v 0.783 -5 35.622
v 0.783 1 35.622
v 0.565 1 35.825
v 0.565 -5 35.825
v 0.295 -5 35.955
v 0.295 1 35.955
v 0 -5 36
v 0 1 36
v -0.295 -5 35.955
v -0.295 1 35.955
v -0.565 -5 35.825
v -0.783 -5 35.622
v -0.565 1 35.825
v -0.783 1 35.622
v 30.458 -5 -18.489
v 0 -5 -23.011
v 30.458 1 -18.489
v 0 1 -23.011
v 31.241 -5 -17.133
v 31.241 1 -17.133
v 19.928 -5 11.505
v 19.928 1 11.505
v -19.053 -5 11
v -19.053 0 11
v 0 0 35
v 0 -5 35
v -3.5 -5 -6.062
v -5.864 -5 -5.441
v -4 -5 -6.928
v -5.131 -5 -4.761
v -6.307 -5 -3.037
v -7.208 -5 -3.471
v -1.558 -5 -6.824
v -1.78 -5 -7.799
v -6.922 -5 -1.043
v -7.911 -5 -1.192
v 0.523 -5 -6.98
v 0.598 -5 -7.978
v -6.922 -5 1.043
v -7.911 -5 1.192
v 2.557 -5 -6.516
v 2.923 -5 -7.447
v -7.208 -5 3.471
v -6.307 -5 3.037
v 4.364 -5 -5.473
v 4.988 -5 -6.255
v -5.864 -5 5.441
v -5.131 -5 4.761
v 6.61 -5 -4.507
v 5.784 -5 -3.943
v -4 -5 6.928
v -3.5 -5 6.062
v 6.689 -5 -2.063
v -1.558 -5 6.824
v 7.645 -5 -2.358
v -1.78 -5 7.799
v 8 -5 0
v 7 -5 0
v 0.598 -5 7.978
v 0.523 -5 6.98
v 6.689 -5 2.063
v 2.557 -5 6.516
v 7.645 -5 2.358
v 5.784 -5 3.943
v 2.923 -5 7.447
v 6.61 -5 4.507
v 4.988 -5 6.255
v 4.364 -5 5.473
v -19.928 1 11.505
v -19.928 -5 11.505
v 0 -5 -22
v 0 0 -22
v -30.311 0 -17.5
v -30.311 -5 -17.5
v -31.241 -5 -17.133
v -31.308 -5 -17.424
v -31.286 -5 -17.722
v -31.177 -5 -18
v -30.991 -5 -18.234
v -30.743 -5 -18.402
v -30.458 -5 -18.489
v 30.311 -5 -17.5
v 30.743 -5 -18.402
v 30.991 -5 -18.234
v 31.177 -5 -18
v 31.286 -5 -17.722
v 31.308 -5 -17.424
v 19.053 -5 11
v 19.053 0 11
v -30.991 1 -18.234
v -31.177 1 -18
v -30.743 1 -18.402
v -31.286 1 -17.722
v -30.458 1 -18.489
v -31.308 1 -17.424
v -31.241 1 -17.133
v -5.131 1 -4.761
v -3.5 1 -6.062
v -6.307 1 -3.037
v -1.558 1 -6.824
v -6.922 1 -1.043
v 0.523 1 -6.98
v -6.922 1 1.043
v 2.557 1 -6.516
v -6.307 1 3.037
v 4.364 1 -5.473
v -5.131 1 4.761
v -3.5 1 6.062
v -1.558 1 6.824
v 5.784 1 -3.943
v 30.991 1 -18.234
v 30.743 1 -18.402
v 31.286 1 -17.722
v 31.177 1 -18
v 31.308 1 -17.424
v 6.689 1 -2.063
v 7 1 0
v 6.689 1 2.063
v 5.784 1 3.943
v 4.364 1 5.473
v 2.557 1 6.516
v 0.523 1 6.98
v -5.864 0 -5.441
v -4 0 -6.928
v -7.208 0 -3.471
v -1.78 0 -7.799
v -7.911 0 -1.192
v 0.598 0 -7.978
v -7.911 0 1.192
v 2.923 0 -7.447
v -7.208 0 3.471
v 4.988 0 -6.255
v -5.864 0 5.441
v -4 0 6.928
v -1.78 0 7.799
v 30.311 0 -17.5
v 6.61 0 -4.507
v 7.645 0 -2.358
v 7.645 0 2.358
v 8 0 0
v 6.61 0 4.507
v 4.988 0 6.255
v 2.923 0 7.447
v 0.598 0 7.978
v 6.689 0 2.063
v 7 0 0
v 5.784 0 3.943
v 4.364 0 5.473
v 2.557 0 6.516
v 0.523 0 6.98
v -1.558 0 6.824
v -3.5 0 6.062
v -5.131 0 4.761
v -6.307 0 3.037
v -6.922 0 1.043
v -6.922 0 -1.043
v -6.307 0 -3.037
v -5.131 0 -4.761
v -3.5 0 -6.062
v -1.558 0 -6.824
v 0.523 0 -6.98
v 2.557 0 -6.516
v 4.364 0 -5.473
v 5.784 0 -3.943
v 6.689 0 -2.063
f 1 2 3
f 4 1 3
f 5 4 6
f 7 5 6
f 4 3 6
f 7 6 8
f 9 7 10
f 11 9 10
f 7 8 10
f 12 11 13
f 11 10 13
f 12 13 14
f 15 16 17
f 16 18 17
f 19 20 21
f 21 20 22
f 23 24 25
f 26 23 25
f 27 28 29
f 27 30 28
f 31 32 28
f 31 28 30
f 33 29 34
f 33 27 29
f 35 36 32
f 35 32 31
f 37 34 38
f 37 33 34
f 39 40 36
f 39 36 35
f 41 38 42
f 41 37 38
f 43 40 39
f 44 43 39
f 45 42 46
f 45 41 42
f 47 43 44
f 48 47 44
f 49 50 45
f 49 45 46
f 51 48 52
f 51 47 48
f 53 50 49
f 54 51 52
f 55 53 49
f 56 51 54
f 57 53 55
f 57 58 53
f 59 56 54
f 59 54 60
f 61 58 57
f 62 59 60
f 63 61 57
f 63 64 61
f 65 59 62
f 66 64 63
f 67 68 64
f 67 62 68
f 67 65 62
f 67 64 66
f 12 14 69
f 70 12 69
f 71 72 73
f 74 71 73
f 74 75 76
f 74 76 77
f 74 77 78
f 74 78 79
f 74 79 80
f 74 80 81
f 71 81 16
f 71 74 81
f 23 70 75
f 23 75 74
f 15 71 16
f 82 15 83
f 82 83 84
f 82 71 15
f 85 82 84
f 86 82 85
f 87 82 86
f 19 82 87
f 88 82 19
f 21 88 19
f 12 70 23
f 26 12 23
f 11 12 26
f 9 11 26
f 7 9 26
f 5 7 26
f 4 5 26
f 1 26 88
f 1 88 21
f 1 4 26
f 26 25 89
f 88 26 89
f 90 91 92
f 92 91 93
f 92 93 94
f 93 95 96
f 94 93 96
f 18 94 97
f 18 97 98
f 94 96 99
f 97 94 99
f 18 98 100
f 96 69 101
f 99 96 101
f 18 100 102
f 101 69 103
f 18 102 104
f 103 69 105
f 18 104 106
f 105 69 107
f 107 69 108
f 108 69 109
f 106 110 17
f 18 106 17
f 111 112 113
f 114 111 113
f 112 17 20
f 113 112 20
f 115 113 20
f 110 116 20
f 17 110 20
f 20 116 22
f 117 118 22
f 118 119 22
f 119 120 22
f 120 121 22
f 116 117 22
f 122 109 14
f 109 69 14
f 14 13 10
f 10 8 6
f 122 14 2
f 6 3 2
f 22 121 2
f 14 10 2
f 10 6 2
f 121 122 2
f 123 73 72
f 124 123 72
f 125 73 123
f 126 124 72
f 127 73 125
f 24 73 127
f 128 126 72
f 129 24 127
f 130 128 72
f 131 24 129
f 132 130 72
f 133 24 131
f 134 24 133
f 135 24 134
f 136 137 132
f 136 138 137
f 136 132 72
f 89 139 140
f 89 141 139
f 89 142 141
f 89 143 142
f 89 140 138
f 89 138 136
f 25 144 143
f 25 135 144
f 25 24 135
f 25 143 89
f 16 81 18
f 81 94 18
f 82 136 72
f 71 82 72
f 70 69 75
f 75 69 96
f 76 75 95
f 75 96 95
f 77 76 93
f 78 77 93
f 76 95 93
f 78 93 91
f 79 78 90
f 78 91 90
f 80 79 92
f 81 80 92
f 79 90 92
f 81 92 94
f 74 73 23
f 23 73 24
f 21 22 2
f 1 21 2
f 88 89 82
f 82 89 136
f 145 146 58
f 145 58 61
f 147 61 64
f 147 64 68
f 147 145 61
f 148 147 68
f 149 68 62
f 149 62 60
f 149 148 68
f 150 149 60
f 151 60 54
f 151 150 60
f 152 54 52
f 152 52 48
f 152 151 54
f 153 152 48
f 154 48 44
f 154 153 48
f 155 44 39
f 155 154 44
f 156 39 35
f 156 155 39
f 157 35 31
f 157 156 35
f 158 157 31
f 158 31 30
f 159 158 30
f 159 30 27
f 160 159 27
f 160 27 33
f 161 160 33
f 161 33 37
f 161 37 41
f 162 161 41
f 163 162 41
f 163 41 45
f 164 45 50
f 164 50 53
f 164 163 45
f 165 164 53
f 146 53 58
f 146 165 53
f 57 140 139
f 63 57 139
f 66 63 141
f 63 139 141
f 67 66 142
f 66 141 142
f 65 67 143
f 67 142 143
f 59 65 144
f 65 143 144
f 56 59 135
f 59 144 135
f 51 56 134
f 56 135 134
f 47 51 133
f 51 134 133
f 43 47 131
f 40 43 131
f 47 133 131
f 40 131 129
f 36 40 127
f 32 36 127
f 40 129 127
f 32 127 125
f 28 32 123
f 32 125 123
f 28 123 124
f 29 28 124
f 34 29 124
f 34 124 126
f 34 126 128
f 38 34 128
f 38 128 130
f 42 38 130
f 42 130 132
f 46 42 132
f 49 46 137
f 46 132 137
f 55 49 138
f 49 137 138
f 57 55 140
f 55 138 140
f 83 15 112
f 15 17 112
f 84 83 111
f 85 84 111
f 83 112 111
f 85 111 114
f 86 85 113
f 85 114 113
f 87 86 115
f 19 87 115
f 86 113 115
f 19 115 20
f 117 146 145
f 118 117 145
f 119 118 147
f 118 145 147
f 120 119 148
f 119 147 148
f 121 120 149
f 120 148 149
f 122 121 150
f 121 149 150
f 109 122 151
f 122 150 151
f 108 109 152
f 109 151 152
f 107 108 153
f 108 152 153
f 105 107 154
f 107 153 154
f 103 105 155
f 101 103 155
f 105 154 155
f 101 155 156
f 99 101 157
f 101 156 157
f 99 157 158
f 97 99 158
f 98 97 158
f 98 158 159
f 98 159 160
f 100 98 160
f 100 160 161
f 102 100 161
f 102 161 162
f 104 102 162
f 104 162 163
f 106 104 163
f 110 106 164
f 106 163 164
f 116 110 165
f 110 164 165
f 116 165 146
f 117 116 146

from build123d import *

# Parameters (mm, degrees)
F0_R     = 8
F0_R_2   = 7
F1_DEPTH = 1
F2_DEPTH = 5


with BuildPart() as f1:
    # F0 (on Front) → F1 (new body)
    with BuildSketch(Plane.XZ):
        with BuildLine():
            Line((-19.928076, 11.50548), (-31.240951, -17.132598))
            ThreePointArc((-31.240951, -17.132598), (-31.176915, -18), (-30.457741, -18.489158))
            Line((-30.457741, -18.489158), (0, -23.01096))
            Line((0, -23.01096), (30.457741, -18.489158))
            ThreePointArc((30.457741, -18.489158), (31.176915, -18), (31.240951, -17.132598))
            Line((31.240951, -17.132598), (19.928076, 11.50548))
            Line((19.928076, 11.50548), (0.78321, 35.621757))
            ThreePointArc((0.78321, 35.621757), (0, 36), (-0.78321, 35.621757))
            Line((-0.78321, 35.621757), (-19.928076, 11.50548))
        make_face()
        Polygon((0, -22), (-30.310889, -17.5), (-19.052559, 11), (0, 35), (19.052559, 11), (30.310889, -17.5), align=None, mode=Mode.SUBTRACT)
        Polygon((-19.052559, 11), (-30.310889, -17.5), (0, -22), (30.310889, -17.5), (19.052559, 11), (0, 35), align=None)
        Circle(F0_R, mode=Mode.SUBTRACT)
        Circle(F0_R)
        Circle(F0_R_2, mode=Mode.SUBTRACT)
    extrude(amount=-F1_DEPTH)

    # F0 (on Front) → F2 (join)
    with BuildSketch(Plane.XZ):
        with BuildLine():
            Line((-19.928076, 11.50548), (-31.240951, -17.132598))
            ThreePointArc((-31.240951, -17.132598), (-31.176915, -18), (-30.457741, -18.489158))
            Line((-30.457741, -18.489158), (0, -23.01096))
            Line((0, -23.01096), (30.457741, -18.489158))
            ThreePointArc((30.457741, -18.489158), (31.176915, -18), (31.240951, -17.132598))
            Line((31.240951, -17.132598), (19.928076, 11.50548))
            Line((19.928076, 11.50548), (0.78321, 35.621757))
            ThreePointArc((0.78321, 35.621757), (0, 36), (-0.78321, 35.621757))
            Line((-0.78321, 35.621757), (-19.928076, 11.50548))
        make_face()
        Polygon((0, -22), (-30.310889, -17.5), (-19.052559, 11), (0, 35), (19.052559, 11), (30.310889, -17.5), align=None, mode=Mode.SUBTRACT)
        Circle(F0_R)
        Circle(F0_R_2, mode=Mode.SUBTRACT)
    extrude(amount=F2_DEPTH)


solid = f1.part
